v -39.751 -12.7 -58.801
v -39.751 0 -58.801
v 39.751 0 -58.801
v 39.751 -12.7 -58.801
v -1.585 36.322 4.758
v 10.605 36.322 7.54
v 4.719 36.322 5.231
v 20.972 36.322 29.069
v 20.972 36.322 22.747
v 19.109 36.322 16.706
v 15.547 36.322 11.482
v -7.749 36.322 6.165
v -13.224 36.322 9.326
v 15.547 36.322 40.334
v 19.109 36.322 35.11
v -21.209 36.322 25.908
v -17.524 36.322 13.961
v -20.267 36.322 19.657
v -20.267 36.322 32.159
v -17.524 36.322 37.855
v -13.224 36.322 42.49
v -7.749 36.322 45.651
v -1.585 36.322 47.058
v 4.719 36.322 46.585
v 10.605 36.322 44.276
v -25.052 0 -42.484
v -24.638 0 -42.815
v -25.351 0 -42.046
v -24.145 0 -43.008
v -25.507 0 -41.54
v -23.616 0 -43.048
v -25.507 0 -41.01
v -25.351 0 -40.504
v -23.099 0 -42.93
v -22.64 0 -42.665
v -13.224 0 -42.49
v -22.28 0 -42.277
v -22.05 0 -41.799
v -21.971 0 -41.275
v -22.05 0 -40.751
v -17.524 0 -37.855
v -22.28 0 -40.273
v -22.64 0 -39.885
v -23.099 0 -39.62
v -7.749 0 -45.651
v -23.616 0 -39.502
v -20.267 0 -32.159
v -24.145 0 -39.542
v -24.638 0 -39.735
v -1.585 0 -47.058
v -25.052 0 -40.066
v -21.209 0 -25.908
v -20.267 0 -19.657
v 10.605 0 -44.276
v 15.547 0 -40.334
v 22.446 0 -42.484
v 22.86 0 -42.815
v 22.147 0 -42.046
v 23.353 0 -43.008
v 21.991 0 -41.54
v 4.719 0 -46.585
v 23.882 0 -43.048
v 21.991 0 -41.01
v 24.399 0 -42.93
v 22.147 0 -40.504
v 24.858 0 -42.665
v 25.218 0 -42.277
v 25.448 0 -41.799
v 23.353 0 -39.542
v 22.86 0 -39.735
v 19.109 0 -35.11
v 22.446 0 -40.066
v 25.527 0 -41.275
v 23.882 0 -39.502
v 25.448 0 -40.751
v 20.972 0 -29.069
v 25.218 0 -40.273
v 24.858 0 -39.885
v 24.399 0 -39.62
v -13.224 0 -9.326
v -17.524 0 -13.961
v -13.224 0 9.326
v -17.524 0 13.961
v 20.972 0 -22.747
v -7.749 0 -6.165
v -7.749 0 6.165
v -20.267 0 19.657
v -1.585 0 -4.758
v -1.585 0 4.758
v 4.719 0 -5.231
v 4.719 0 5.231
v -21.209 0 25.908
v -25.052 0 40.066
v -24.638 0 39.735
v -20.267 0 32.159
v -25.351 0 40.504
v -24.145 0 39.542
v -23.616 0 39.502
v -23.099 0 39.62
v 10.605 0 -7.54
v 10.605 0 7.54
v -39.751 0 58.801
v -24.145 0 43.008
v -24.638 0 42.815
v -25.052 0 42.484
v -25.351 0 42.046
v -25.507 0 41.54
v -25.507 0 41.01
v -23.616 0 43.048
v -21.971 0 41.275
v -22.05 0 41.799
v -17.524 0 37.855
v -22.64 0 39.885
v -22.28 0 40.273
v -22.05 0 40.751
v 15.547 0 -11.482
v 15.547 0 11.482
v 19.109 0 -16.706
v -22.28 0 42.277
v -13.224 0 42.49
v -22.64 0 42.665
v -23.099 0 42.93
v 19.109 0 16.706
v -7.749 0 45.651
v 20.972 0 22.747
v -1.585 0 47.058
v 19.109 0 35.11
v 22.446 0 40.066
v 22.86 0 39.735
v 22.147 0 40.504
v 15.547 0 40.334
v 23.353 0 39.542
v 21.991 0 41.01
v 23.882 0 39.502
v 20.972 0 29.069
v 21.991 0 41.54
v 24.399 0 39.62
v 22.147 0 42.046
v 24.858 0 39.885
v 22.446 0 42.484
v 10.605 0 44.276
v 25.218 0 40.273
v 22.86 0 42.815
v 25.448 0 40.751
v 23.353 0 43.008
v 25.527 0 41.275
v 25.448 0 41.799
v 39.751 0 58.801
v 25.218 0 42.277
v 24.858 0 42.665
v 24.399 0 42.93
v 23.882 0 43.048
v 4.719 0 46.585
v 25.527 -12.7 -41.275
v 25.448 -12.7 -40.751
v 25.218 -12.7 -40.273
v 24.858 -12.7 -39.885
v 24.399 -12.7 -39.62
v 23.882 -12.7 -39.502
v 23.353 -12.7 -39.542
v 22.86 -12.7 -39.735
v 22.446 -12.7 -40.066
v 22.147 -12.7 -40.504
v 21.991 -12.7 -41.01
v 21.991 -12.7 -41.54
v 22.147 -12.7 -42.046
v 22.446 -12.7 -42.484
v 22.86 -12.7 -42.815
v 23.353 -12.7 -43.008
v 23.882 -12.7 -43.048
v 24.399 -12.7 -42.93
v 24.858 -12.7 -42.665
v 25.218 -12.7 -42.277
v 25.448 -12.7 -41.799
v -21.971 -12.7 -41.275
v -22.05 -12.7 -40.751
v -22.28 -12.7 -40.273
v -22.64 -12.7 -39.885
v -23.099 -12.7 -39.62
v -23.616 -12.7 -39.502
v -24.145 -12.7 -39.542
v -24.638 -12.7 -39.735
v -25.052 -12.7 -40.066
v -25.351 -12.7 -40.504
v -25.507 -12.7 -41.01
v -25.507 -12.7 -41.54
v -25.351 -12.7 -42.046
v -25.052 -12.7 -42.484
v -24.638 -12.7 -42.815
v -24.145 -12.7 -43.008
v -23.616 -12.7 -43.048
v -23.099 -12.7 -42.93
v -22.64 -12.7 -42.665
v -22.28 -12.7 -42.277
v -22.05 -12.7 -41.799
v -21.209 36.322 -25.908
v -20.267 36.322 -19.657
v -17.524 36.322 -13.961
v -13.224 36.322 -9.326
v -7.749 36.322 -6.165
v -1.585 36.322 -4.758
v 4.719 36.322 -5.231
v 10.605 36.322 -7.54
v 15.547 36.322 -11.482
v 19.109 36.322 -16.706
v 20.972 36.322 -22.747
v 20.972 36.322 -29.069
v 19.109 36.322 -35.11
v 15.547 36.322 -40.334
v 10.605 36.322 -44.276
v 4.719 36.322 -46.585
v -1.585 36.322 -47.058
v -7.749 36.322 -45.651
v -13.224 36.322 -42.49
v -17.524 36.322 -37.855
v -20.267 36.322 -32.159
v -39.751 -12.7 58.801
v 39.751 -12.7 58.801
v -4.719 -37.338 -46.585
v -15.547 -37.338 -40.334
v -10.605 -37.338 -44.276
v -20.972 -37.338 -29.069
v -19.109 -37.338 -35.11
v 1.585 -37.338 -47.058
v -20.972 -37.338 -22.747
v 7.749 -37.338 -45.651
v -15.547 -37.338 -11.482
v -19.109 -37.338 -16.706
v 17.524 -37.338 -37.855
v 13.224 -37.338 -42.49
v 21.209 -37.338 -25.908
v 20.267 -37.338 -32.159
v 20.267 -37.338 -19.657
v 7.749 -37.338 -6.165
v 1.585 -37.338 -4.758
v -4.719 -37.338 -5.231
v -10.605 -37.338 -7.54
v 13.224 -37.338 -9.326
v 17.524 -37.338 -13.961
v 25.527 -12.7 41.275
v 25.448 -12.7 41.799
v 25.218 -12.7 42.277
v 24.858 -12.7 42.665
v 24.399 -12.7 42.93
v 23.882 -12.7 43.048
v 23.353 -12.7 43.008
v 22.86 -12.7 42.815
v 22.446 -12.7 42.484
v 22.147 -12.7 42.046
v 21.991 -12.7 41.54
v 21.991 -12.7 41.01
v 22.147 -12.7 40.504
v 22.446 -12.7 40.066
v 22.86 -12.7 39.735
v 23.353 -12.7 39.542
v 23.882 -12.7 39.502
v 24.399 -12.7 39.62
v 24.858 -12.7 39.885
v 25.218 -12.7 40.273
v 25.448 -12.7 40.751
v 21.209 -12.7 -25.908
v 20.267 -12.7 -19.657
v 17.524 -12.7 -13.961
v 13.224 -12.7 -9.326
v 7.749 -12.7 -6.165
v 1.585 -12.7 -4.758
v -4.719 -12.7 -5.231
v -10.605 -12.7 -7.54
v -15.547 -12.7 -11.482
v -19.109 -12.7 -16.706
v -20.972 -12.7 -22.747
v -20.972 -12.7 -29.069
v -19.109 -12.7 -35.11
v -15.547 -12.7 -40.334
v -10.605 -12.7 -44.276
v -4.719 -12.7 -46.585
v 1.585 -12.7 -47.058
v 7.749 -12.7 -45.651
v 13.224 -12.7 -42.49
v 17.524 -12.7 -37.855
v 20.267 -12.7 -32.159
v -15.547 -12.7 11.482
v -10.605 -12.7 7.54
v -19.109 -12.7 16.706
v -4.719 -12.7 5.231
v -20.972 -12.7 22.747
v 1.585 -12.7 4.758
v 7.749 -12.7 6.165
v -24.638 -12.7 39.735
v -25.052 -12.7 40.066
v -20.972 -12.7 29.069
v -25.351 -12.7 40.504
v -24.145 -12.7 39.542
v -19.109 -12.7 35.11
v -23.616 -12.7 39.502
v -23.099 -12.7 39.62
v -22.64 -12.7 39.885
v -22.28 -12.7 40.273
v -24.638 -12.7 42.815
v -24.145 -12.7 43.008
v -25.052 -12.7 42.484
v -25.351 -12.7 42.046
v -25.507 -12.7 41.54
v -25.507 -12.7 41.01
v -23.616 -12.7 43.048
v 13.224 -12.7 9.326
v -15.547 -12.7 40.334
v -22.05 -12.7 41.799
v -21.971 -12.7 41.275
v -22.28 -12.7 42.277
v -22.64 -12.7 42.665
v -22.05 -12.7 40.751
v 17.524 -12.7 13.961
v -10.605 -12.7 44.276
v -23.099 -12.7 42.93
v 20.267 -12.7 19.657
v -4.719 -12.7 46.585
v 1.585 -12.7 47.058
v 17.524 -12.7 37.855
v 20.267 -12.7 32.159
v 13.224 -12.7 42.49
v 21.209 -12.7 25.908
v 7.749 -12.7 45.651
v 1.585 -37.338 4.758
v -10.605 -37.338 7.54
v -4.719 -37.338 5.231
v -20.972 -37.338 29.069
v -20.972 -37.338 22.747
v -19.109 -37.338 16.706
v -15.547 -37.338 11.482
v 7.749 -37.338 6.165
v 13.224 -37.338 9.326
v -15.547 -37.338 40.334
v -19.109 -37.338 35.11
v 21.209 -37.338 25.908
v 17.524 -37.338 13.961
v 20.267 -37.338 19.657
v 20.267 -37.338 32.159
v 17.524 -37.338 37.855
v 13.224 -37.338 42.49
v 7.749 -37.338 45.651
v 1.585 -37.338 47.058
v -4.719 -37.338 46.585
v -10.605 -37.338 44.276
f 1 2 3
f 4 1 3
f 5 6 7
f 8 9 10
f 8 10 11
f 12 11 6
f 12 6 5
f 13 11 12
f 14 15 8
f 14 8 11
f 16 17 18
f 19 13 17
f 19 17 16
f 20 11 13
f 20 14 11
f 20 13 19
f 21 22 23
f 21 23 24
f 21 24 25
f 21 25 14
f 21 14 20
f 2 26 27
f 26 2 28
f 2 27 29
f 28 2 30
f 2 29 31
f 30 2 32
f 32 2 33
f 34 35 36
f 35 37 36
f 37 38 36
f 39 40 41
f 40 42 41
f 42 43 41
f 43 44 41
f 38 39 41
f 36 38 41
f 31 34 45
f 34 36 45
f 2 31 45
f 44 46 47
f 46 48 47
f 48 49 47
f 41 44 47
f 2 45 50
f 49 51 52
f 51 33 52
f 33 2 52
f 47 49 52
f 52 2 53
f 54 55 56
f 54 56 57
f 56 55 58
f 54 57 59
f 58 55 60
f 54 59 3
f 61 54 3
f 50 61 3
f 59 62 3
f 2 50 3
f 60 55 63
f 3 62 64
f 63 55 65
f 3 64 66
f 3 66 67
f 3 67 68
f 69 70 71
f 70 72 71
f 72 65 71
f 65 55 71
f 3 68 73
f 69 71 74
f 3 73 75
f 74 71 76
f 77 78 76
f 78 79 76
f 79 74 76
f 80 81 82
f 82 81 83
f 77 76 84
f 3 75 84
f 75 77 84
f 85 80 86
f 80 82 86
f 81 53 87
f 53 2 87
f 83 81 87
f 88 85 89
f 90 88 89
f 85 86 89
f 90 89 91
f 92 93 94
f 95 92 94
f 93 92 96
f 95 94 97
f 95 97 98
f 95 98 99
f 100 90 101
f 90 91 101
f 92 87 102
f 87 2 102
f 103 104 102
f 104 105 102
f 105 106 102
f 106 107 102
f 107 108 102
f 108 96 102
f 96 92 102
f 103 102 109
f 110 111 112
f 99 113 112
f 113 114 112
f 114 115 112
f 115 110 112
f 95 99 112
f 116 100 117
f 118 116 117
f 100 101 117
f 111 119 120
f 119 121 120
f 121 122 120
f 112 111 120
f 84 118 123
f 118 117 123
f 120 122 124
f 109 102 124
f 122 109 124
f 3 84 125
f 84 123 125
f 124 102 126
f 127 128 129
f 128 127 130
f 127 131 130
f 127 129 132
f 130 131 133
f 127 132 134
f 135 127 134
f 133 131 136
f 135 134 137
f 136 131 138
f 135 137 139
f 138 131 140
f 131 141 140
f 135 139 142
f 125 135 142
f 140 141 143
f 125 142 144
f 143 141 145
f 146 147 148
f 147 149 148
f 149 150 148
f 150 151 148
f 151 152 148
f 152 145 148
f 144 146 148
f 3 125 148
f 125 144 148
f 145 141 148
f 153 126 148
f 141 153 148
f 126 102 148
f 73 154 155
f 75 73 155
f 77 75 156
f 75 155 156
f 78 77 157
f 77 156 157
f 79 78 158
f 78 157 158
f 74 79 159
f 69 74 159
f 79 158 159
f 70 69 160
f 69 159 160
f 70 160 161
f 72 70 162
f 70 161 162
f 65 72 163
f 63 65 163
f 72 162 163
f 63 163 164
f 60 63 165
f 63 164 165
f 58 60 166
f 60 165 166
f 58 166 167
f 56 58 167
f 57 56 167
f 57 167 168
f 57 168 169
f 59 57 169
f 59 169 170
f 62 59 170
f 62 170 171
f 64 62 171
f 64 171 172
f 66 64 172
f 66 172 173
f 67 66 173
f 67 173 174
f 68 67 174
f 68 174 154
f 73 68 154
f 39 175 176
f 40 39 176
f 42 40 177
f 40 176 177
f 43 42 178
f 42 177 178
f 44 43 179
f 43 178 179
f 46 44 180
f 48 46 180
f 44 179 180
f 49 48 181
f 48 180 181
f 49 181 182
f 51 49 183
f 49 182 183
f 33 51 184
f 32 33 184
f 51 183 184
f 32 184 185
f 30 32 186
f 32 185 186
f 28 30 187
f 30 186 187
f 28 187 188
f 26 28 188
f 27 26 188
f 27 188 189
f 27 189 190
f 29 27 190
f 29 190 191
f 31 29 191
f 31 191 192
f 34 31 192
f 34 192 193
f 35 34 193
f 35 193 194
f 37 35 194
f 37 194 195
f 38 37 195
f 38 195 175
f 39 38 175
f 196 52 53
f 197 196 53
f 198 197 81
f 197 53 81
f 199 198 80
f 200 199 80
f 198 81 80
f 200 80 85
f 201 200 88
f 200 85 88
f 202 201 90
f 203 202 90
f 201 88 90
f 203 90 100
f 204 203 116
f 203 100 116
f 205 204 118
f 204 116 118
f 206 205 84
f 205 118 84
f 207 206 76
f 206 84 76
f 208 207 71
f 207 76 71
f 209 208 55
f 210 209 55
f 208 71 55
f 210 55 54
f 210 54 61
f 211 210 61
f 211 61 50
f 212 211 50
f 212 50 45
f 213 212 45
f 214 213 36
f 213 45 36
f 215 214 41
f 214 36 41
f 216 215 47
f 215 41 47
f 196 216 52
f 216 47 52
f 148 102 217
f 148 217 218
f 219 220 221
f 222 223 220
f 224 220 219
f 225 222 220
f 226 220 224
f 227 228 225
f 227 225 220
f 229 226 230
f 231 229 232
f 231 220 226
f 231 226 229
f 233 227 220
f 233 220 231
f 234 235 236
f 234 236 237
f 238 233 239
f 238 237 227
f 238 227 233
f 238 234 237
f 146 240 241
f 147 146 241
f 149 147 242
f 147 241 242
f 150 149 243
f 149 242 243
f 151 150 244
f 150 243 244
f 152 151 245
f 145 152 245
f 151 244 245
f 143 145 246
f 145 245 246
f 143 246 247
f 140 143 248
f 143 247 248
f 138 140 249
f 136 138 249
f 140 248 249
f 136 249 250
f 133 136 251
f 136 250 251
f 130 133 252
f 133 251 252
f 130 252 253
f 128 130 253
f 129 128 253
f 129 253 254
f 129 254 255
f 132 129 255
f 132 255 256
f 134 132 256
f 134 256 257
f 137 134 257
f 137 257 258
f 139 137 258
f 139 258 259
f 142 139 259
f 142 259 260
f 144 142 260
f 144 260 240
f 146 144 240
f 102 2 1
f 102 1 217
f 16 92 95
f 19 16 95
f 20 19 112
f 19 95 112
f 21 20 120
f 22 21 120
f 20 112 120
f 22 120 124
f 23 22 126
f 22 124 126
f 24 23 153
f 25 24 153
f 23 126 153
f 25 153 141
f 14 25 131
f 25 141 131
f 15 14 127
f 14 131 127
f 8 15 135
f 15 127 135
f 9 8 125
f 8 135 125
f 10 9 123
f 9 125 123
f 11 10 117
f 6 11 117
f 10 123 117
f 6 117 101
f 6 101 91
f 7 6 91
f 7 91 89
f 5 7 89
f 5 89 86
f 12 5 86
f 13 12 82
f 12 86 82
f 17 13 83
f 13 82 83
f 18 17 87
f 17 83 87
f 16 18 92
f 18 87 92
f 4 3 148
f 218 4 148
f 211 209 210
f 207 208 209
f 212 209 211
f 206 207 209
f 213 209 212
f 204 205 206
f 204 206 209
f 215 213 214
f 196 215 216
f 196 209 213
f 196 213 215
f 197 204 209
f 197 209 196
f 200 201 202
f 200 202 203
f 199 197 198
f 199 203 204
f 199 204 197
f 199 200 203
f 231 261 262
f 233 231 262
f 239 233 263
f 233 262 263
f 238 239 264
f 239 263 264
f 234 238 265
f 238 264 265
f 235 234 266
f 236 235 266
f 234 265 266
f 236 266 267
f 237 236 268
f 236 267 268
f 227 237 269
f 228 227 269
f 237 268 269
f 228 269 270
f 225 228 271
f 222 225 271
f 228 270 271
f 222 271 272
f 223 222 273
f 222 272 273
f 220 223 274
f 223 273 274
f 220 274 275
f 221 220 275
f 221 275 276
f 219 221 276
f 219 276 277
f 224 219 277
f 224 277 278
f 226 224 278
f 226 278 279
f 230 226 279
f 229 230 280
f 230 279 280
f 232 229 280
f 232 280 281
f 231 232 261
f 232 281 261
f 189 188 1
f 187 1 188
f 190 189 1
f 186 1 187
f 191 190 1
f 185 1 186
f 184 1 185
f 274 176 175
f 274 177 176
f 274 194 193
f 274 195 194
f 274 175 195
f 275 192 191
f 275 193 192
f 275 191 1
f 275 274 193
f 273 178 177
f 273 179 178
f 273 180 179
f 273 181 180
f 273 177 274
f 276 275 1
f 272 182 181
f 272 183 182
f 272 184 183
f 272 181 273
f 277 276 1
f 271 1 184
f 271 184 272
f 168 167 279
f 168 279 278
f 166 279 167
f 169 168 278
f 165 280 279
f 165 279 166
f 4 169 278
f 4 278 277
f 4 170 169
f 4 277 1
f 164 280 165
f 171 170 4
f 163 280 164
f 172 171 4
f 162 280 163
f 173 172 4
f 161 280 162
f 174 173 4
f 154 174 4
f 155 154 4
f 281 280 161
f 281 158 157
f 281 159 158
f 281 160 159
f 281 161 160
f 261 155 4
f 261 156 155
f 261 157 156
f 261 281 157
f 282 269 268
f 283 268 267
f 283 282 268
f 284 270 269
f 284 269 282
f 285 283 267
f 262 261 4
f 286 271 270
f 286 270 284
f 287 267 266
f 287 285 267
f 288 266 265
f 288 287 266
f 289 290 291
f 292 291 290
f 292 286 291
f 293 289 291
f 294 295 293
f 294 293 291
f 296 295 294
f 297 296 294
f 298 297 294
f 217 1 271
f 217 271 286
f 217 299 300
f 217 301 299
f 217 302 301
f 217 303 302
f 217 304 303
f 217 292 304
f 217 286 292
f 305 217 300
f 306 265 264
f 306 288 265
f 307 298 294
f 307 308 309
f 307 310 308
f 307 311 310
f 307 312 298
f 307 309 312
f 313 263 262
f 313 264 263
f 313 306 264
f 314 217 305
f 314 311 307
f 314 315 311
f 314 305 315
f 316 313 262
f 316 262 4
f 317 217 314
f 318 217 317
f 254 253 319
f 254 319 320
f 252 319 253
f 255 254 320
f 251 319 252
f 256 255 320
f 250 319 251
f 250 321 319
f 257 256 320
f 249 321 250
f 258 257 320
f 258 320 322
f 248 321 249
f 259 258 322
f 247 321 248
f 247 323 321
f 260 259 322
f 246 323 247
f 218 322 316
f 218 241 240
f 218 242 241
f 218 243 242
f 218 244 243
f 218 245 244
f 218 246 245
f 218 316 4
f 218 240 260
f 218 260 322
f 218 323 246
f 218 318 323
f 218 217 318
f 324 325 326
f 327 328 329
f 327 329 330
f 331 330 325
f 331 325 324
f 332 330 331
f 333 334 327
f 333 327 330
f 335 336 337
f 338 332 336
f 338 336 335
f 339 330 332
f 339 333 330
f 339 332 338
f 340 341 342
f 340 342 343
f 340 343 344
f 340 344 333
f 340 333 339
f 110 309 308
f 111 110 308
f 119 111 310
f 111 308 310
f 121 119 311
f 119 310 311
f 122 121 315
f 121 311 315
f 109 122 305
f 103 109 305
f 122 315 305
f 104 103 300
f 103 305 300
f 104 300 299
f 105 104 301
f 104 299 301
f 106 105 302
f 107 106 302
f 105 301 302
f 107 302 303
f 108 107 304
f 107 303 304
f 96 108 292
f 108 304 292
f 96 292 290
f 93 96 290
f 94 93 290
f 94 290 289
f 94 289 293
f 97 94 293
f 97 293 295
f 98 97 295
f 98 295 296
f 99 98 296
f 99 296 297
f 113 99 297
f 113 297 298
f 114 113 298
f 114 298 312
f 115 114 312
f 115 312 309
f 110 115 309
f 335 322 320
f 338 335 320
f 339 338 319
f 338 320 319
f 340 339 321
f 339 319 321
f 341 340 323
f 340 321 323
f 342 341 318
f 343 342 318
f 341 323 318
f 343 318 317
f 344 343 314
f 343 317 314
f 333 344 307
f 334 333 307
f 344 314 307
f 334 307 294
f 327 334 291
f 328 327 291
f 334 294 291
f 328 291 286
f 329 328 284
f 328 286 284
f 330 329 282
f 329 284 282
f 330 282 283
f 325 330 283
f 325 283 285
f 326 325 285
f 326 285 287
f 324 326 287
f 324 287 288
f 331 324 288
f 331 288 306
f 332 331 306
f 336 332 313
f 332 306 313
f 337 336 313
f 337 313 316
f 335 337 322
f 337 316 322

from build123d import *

# Parameters (mm, degrees)
F0_W     = 79.502
F0_H     = 117.602
F1_DEPTH = 12.7
F2_R     = 1.778
F3_DEPTH = 12.701
F4_R     = 21.209
F5_DEPTH = 36.322
F6_R     = 21.209
F7_DEPTH = 24.638


with BuildPart() as f1:
    # F0 (on Front) → F1 (new body)
    with BuildSketch(Plane.XZ):
        Rectangle(F0_W, F0_H)
    extrude(amount=F1_DEPTH)

    # F2 (on face) → F3 (cut, through all)
    with BuildSketch(Plane.XZ.offset(12.7)):
        with Locations((-23.749, 41.275)):
            Circle(F2_R)
        with Locations((23.749, 41.275)):
            Circle(F2_R)
        with Locations((-23.749, -41.275)):
            Circle(F2_R)
        with Locations((23.749, -41.275)):
            Circle(F2_R)
    extrude(amount=-F3_DEPTH, mode=Mode.SUBTRACT)

    # F4 (on face) → F5 (join)
    with BuildSketch(Plane(origin=(0, 0, 0), x_dir=(-1, 0, 0), z_dir=(0, 1, 0))):
        with Locations((0, 25.908)):
            Circle(F4_R)
        with Locations((0, -25.908)):
            Circle(F4_R)
    extrude(amount=F5_DEPTH)

    # F6 (on face) → F7 (join)
    with BuildSketch(Plane.XZ.offset(12.7)):
        with Locations((0, 25.908)):
            Circle(F6_R)
        with Locations((0, -25.908)):
            Circle(F6_R)
    extrude(amount=F7_DEPTH)


solid = f1.part
